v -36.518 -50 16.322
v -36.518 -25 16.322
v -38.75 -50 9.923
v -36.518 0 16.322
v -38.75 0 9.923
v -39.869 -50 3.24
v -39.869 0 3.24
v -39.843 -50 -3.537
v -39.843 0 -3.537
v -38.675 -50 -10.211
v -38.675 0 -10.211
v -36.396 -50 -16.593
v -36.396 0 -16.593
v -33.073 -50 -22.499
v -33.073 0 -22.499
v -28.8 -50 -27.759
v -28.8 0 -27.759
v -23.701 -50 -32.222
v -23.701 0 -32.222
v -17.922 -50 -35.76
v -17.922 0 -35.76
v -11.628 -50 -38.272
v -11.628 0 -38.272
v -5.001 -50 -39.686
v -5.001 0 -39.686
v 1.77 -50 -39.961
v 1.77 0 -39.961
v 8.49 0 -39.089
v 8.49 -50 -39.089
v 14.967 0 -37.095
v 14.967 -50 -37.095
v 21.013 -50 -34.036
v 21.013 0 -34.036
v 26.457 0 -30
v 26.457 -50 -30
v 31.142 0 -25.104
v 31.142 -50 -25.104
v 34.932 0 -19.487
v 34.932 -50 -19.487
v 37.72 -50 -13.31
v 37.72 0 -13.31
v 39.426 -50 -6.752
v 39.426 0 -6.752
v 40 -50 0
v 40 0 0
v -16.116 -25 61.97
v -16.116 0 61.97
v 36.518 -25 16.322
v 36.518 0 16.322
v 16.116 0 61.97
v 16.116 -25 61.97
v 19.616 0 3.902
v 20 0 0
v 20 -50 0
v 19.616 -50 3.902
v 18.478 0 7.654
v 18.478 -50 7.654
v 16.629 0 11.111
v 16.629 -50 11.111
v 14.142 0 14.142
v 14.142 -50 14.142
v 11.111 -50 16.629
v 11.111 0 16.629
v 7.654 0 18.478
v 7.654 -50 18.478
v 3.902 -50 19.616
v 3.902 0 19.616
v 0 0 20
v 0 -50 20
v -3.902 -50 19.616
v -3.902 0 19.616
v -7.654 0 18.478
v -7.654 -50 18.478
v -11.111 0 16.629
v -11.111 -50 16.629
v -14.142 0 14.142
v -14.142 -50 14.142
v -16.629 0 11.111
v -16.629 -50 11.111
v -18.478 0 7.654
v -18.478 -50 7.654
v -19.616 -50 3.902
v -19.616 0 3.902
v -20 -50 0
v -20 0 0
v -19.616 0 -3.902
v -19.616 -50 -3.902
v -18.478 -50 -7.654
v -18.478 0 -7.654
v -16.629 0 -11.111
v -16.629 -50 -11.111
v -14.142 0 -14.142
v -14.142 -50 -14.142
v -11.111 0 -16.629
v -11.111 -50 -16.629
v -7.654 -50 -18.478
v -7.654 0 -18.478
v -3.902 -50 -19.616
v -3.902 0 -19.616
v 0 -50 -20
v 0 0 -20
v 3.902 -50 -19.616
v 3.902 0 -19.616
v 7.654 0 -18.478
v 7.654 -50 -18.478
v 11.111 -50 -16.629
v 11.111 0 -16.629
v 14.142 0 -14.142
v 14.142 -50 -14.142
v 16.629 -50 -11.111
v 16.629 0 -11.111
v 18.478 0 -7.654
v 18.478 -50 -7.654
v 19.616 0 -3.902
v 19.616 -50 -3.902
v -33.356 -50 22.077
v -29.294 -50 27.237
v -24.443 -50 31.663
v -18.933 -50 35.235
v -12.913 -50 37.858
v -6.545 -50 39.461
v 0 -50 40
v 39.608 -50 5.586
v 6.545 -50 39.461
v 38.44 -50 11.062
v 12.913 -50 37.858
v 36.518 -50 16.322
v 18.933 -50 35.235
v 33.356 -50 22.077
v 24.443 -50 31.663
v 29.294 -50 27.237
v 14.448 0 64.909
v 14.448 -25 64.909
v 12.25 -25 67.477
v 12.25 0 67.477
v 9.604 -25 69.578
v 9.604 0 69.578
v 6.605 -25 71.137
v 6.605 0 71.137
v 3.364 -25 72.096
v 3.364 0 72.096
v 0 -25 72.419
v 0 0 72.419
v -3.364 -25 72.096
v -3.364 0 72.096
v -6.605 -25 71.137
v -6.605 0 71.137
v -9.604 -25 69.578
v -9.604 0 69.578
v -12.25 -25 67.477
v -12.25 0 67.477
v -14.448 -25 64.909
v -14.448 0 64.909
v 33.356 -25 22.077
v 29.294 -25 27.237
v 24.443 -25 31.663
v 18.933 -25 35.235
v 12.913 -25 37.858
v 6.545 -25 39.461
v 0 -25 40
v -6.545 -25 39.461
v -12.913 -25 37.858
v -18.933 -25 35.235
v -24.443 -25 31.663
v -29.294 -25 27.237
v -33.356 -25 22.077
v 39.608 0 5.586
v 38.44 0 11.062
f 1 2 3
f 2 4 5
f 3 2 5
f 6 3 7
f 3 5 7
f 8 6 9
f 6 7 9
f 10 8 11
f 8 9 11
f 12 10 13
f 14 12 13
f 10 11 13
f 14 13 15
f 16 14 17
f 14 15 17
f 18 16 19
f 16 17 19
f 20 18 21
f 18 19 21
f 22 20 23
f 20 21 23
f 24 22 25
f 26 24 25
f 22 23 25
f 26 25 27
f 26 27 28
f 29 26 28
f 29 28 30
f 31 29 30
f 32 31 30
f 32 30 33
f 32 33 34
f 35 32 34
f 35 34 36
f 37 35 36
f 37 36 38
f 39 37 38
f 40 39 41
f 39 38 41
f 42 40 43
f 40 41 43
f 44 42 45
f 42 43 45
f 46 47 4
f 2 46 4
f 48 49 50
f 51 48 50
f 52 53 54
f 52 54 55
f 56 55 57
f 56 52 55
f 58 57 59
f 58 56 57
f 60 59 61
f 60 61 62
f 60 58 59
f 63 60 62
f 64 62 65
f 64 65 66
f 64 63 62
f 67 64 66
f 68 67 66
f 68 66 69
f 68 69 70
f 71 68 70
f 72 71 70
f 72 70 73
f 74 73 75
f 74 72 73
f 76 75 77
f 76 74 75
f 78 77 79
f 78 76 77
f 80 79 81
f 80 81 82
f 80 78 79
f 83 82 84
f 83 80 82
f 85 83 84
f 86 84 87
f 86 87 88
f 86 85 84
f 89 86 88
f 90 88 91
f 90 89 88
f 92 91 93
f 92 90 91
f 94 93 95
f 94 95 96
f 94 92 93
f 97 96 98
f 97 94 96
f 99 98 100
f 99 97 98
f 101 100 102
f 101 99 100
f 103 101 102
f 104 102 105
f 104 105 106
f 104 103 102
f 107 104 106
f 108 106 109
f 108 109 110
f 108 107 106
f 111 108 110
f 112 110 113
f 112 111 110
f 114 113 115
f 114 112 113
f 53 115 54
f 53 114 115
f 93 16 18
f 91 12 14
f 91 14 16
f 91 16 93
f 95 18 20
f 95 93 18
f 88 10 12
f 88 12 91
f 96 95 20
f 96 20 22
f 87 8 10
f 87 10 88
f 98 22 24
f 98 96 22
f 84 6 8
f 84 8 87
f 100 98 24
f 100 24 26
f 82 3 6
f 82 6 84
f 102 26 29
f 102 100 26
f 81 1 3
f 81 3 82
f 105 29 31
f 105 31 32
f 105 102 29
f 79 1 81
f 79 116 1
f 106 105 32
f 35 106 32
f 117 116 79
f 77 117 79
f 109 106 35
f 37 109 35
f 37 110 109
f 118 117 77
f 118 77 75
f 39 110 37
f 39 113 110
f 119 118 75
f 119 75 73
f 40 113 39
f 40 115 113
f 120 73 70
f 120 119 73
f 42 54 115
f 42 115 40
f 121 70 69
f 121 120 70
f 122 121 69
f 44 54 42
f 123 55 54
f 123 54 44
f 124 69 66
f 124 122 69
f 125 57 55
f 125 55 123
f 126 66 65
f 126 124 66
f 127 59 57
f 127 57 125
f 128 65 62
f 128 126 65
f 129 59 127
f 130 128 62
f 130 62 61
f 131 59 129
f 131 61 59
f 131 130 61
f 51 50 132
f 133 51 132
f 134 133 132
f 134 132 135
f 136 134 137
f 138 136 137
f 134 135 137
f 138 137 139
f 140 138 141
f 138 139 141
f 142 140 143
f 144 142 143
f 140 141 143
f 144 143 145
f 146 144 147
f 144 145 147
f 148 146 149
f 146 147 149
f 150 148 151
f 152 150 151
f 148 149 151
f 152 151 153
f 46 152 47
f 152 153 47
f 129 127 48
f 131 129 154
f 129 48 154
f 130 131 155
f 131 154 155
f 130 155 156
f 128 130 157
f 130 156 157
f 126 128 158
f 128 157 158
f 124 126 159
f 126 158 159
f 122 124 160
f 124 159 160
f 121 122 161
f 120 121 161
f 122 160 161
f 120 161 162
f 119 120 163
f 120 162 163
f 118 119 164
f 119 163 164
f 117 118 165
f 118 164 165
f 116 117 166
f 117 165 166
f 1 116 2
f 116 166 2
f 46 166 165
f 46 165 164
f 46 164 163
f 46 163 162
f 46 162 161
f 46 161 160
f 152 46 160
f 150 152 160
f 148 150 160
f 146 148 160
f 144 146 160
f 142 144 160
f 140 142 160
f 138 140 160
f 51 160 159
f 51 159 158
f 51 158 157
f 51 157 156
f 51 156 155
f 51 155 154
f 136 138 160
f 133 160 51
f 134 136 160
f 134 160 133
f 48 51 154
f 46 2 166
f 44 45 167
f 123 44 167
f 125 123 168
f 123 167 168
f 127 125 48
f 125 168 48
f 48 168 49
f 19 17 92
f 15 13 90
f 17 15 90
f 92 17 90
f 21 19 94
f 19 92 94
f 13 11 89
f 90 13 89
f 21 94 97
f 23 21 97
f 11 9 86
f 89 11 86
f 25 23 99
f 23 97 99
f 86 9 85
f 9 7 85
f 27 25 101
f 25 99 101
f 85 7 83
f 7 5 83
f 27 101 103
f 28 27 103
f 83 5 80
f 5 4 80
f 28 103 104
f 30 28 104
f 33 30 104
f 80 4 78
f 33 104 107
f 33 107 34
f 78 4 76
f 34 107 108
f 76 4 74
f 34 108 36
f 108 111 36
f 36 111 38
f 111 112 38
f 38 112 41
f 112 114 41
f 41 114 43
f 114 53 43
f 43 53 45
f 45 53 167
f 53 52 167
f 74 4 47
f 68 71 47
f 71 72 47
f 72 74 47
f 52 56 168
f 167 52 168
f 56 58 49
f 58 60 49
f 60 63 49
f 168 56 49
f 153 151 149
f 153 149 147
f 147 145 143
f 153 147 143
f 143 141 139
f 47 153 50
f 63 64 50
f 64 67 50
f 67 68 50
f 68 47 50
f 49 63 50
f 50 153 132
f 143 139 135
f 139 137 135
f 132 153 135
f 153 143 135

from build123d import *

# Parameters (mm, degrees)
F0_R     = 20
F1_DEPTH = 50
F2_DEPTH = 25


with BuildPart() as f1:
    # F0 (on Front) → F1 (new body)
    with BuildSketch(Plane.XZ):
        with BuildLine():
            ThreePointArc((-36.518415, 16.321929), (-8.344561, -39.119922), (40, 0))
            ThreePointArc((40, 0), (39.119922, 8.344561), (36.518415, 16.321929))
            ThreePointArc((36.518415, 16.321929), (0, 40), (-36.518415, 16.321929))
        make_face()
        Circle(F0_R, mode=Mode.SUBTRACT)
    extrude(amount=F1_DEPTH)

    # F0 (on Front) → F2 (join)
    with BuildSketch(Plane.XZ):
        with BuildLine():
            ThreePointArc((-36.518415, 16.321929), (0, 40), (36.518415, 16.321929))
            Line((36.518415, 16.321929), (16.116004, 61.969948))
            ThreePointArc((16.116004, 61.969948), (0, 72.419358), (-16.116004, 61.969948))
            Line((-16.116004, 61.969948), (-36.518415, 16.321929))
        make_face()
    extrude(amount=F2_DEPTH)


solid = f1.part
